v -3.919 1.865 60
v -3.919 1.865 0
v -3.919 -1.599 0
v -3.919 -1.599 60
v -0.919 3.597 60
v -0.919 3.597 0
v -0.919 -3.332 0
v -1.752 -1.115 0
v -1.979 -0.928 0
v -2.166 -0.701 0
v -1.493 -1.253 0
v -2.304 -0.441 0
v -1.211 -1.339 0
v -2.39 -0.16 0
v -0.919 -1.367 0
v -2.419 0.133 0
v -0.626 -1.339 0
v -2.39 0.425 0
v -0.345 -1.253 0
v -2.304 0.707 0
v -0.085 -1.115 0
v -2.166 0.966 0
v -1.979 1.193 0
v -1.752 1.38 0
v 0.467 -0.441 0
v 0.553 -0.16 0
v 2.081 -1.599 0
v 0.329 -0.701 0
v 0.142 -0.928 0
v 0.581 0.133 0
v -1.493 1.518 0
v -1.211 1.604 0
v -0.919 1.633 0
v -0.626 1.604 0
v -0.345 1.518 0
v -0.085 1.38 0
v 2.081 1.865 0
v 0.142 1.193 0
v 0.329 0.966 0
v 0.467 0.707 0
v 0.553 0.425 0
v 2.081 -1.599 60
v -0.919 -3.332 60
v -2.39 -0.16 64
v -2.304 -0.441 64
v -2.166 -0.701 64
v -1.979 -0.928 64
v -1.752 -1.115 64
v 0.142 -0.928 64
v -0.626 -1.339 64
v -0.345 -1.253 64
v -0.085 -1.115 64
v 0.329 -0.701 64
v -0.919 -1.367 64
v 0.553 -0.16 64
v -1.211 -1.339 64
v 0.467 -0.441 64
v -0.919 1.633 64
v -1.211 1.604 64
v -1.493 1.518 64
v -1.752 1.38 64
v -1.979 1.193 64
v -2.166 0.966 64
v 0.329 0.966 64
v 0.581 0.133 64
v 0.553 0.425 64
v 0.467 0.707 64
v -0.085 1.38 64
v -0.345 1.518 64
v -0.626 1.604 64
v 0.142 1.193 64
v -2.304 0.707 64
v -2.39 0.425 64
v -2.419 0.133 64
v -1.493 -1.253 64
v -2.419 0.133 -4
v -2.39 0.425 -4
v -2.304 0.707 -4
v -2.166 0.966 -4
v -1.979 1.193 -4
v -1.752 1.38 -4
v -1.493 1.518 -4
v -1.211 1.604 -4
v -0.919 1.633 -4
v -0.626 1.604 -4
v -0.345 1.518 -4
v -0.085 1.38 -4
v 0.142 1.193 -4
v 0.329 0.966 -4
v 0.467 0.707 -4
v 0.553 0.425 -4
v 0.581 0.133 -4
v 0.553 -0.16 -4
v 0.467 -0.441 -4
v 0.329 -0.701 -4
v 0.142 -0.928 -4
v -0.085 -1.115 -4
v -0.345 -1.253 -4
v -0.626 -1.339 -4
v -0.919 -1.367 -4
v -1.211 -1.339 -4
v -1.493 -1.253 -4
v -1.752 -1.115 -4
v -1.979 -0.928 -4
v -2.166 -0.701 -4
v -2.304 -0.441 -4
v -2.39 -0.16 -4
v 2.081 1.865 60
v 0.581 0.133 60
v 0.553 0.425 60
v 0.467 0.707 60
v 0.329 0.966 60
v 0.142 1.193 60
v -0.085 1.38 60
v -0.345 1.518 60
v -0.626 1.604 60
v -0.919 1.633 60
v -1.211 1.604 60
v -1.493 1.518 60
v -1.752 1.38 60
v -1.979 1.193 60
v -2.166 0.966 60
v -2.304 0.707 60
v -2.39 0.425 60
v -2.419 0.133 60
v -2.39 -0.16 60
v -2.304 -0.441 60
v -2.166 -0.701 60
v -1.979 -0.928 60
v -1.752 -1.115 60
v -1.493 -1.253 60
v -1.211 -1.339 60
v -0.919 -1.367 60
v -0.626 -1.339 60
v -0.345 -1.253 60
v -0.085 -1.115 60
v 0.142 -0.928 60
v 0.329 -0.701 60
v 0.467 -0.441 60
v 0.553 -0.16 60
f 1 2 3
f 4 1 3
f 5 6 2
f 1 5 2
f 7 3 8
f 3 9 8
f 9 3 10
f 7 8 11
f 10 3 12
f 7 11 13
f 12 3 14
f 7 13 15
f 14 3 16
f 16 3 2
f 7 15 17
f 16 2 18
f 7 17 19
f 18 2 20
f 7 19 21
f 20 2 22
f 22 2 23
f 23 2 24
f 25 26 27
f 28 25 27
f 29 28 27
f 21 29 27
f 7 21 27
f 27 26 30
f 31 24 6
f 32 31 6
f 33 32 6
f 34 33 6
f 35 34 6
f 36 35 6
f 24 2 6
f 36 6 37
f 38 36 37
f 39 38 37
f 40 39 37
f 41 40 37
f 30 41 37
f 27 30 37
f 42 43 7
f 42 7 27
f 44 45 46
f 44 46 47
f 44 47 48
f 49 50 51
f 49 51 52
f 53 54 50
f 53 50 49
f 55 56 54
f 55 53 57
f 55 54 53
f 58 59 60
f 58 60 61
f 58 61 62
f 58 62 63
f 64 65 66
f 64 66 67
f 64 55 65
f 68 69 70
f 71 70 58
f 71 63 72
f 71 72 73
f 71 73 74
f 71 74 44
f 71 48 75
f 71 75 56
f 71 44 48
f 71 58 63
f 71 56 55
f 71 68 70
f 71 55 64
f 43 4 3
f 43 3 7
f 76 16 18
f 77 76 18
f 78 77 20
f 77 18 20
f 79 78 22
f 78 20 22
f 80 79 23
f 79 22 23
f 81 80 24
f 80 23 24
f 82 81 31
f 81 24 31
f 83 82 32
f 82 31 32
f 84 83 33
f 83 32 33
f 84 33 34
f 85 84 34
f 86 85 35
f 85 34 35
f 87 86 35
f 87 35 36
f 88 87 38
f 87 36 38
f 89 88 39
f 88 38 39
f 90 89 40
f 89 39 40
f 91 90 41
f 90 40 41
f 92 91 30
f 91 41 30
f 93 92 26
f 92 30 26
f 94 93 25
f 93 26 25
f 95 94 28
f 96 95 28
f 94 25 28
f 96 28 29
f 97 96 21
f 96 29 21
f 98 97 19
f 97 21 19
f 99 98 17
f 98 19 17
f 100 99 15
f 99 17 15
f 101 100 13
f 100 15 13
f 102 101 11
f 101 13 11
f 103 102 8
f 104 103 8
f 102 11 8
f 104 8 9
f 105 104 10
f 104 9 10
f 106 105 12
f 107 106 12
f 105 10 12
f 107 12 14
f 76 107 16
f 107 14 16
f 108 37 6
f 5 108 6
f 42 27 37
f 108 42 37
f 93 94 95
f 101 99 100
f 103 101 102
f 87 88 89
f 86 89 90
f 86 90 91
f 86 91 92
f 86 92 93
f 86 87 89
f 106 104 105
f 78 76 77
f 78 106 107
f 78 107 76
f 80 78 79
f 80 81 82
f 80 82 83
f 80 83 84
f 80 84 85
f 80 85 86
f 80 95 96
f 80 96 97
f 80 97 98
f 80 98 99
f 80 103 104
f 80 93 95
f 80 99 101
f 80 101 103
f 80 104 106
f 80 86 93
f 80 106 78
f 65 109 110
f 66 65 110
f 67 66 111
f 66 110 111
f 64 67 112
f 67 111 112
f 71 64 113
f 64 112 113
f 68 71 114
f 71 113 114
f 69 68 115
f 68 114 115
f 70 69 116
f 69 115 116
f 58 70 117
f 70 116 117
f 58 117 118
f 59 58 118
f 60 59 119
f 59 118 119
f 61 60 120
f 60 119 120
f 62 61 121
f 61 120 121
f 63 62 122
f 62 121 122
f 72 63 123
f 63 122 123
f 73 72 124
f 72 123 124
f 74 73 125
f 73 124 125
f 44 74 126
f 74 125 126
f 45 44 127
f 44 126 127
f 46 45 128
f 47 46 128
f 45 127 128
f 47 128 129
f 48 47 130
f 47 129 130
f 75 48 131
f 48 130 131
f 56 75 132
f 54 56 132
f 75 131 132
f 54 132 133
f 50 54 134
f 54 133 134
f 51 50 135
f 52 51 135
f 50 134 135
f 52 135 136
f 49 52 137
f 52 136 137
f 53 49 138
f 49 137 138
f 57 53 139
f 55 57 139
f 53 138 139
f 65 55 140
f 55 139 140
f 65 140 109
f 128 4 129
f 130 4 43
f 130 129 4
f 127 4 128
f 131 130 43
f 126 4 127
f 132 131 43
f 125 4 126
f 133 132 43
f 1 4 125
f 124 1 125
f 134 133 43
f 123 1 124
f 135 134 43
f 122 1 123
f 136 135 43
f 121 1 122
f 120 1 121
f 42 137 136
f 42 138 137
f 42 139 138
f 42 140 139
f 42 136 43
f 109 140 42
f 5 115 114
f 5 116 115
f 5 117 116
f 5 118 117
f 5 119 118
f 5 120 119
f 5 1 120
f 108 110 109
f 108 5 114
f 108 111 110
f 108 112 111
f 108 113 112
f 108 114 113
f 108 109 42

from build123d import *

# Parameters (mm, degrees)
BOSS_EXTRUDE1_DEPTH = 60
SKETCH2_R           = 1.5
BOSS_EXTRUDE2_DEPTH = 4
SKETCH3_R           = 1.5
BOSS_EXTRUDE3_DEPTH = 4


with BuildPart() as part:
    # Sketch1 → Boss-Extrude1 (new body)
    with BuildSketch(Plane.XY):
        Polygon((-0.918598934, -3.331524887), (2.081401066, -1.599474079), (2.081401066, 1.864627536), (-0.918598934, 3.596678344), (-3.918598934, 1.864627536), (-3.918598934, -1.599474079), align=None)
    extrude(amount=BOSS_EXTRUDE1_DEPTH)

    # Sketch2 → Boss-Extrude2 (add)
    with BuildSketch(Plane.XY.offset(60)):
        with Locations((-0.918598934, 0.132576728)):
            Circle(SKETCH2_R)
    extrude(amount=BOSS_EXTRUDE2_DEPTH)

    # Sketch3 → Boss-Extrude3 (add)
    with BuildSketch(Plane(origin=(0, 0, 0), x_dir=(-1, 0, 0), z_dir=(0, 0, -1))):
        with Locations((0.918598934, 0.132576728)):
            Circle(SKETCH3_R)
    extrude(amount=BOSS_EXTRUDE3_DEPTH)


solid = part.part
